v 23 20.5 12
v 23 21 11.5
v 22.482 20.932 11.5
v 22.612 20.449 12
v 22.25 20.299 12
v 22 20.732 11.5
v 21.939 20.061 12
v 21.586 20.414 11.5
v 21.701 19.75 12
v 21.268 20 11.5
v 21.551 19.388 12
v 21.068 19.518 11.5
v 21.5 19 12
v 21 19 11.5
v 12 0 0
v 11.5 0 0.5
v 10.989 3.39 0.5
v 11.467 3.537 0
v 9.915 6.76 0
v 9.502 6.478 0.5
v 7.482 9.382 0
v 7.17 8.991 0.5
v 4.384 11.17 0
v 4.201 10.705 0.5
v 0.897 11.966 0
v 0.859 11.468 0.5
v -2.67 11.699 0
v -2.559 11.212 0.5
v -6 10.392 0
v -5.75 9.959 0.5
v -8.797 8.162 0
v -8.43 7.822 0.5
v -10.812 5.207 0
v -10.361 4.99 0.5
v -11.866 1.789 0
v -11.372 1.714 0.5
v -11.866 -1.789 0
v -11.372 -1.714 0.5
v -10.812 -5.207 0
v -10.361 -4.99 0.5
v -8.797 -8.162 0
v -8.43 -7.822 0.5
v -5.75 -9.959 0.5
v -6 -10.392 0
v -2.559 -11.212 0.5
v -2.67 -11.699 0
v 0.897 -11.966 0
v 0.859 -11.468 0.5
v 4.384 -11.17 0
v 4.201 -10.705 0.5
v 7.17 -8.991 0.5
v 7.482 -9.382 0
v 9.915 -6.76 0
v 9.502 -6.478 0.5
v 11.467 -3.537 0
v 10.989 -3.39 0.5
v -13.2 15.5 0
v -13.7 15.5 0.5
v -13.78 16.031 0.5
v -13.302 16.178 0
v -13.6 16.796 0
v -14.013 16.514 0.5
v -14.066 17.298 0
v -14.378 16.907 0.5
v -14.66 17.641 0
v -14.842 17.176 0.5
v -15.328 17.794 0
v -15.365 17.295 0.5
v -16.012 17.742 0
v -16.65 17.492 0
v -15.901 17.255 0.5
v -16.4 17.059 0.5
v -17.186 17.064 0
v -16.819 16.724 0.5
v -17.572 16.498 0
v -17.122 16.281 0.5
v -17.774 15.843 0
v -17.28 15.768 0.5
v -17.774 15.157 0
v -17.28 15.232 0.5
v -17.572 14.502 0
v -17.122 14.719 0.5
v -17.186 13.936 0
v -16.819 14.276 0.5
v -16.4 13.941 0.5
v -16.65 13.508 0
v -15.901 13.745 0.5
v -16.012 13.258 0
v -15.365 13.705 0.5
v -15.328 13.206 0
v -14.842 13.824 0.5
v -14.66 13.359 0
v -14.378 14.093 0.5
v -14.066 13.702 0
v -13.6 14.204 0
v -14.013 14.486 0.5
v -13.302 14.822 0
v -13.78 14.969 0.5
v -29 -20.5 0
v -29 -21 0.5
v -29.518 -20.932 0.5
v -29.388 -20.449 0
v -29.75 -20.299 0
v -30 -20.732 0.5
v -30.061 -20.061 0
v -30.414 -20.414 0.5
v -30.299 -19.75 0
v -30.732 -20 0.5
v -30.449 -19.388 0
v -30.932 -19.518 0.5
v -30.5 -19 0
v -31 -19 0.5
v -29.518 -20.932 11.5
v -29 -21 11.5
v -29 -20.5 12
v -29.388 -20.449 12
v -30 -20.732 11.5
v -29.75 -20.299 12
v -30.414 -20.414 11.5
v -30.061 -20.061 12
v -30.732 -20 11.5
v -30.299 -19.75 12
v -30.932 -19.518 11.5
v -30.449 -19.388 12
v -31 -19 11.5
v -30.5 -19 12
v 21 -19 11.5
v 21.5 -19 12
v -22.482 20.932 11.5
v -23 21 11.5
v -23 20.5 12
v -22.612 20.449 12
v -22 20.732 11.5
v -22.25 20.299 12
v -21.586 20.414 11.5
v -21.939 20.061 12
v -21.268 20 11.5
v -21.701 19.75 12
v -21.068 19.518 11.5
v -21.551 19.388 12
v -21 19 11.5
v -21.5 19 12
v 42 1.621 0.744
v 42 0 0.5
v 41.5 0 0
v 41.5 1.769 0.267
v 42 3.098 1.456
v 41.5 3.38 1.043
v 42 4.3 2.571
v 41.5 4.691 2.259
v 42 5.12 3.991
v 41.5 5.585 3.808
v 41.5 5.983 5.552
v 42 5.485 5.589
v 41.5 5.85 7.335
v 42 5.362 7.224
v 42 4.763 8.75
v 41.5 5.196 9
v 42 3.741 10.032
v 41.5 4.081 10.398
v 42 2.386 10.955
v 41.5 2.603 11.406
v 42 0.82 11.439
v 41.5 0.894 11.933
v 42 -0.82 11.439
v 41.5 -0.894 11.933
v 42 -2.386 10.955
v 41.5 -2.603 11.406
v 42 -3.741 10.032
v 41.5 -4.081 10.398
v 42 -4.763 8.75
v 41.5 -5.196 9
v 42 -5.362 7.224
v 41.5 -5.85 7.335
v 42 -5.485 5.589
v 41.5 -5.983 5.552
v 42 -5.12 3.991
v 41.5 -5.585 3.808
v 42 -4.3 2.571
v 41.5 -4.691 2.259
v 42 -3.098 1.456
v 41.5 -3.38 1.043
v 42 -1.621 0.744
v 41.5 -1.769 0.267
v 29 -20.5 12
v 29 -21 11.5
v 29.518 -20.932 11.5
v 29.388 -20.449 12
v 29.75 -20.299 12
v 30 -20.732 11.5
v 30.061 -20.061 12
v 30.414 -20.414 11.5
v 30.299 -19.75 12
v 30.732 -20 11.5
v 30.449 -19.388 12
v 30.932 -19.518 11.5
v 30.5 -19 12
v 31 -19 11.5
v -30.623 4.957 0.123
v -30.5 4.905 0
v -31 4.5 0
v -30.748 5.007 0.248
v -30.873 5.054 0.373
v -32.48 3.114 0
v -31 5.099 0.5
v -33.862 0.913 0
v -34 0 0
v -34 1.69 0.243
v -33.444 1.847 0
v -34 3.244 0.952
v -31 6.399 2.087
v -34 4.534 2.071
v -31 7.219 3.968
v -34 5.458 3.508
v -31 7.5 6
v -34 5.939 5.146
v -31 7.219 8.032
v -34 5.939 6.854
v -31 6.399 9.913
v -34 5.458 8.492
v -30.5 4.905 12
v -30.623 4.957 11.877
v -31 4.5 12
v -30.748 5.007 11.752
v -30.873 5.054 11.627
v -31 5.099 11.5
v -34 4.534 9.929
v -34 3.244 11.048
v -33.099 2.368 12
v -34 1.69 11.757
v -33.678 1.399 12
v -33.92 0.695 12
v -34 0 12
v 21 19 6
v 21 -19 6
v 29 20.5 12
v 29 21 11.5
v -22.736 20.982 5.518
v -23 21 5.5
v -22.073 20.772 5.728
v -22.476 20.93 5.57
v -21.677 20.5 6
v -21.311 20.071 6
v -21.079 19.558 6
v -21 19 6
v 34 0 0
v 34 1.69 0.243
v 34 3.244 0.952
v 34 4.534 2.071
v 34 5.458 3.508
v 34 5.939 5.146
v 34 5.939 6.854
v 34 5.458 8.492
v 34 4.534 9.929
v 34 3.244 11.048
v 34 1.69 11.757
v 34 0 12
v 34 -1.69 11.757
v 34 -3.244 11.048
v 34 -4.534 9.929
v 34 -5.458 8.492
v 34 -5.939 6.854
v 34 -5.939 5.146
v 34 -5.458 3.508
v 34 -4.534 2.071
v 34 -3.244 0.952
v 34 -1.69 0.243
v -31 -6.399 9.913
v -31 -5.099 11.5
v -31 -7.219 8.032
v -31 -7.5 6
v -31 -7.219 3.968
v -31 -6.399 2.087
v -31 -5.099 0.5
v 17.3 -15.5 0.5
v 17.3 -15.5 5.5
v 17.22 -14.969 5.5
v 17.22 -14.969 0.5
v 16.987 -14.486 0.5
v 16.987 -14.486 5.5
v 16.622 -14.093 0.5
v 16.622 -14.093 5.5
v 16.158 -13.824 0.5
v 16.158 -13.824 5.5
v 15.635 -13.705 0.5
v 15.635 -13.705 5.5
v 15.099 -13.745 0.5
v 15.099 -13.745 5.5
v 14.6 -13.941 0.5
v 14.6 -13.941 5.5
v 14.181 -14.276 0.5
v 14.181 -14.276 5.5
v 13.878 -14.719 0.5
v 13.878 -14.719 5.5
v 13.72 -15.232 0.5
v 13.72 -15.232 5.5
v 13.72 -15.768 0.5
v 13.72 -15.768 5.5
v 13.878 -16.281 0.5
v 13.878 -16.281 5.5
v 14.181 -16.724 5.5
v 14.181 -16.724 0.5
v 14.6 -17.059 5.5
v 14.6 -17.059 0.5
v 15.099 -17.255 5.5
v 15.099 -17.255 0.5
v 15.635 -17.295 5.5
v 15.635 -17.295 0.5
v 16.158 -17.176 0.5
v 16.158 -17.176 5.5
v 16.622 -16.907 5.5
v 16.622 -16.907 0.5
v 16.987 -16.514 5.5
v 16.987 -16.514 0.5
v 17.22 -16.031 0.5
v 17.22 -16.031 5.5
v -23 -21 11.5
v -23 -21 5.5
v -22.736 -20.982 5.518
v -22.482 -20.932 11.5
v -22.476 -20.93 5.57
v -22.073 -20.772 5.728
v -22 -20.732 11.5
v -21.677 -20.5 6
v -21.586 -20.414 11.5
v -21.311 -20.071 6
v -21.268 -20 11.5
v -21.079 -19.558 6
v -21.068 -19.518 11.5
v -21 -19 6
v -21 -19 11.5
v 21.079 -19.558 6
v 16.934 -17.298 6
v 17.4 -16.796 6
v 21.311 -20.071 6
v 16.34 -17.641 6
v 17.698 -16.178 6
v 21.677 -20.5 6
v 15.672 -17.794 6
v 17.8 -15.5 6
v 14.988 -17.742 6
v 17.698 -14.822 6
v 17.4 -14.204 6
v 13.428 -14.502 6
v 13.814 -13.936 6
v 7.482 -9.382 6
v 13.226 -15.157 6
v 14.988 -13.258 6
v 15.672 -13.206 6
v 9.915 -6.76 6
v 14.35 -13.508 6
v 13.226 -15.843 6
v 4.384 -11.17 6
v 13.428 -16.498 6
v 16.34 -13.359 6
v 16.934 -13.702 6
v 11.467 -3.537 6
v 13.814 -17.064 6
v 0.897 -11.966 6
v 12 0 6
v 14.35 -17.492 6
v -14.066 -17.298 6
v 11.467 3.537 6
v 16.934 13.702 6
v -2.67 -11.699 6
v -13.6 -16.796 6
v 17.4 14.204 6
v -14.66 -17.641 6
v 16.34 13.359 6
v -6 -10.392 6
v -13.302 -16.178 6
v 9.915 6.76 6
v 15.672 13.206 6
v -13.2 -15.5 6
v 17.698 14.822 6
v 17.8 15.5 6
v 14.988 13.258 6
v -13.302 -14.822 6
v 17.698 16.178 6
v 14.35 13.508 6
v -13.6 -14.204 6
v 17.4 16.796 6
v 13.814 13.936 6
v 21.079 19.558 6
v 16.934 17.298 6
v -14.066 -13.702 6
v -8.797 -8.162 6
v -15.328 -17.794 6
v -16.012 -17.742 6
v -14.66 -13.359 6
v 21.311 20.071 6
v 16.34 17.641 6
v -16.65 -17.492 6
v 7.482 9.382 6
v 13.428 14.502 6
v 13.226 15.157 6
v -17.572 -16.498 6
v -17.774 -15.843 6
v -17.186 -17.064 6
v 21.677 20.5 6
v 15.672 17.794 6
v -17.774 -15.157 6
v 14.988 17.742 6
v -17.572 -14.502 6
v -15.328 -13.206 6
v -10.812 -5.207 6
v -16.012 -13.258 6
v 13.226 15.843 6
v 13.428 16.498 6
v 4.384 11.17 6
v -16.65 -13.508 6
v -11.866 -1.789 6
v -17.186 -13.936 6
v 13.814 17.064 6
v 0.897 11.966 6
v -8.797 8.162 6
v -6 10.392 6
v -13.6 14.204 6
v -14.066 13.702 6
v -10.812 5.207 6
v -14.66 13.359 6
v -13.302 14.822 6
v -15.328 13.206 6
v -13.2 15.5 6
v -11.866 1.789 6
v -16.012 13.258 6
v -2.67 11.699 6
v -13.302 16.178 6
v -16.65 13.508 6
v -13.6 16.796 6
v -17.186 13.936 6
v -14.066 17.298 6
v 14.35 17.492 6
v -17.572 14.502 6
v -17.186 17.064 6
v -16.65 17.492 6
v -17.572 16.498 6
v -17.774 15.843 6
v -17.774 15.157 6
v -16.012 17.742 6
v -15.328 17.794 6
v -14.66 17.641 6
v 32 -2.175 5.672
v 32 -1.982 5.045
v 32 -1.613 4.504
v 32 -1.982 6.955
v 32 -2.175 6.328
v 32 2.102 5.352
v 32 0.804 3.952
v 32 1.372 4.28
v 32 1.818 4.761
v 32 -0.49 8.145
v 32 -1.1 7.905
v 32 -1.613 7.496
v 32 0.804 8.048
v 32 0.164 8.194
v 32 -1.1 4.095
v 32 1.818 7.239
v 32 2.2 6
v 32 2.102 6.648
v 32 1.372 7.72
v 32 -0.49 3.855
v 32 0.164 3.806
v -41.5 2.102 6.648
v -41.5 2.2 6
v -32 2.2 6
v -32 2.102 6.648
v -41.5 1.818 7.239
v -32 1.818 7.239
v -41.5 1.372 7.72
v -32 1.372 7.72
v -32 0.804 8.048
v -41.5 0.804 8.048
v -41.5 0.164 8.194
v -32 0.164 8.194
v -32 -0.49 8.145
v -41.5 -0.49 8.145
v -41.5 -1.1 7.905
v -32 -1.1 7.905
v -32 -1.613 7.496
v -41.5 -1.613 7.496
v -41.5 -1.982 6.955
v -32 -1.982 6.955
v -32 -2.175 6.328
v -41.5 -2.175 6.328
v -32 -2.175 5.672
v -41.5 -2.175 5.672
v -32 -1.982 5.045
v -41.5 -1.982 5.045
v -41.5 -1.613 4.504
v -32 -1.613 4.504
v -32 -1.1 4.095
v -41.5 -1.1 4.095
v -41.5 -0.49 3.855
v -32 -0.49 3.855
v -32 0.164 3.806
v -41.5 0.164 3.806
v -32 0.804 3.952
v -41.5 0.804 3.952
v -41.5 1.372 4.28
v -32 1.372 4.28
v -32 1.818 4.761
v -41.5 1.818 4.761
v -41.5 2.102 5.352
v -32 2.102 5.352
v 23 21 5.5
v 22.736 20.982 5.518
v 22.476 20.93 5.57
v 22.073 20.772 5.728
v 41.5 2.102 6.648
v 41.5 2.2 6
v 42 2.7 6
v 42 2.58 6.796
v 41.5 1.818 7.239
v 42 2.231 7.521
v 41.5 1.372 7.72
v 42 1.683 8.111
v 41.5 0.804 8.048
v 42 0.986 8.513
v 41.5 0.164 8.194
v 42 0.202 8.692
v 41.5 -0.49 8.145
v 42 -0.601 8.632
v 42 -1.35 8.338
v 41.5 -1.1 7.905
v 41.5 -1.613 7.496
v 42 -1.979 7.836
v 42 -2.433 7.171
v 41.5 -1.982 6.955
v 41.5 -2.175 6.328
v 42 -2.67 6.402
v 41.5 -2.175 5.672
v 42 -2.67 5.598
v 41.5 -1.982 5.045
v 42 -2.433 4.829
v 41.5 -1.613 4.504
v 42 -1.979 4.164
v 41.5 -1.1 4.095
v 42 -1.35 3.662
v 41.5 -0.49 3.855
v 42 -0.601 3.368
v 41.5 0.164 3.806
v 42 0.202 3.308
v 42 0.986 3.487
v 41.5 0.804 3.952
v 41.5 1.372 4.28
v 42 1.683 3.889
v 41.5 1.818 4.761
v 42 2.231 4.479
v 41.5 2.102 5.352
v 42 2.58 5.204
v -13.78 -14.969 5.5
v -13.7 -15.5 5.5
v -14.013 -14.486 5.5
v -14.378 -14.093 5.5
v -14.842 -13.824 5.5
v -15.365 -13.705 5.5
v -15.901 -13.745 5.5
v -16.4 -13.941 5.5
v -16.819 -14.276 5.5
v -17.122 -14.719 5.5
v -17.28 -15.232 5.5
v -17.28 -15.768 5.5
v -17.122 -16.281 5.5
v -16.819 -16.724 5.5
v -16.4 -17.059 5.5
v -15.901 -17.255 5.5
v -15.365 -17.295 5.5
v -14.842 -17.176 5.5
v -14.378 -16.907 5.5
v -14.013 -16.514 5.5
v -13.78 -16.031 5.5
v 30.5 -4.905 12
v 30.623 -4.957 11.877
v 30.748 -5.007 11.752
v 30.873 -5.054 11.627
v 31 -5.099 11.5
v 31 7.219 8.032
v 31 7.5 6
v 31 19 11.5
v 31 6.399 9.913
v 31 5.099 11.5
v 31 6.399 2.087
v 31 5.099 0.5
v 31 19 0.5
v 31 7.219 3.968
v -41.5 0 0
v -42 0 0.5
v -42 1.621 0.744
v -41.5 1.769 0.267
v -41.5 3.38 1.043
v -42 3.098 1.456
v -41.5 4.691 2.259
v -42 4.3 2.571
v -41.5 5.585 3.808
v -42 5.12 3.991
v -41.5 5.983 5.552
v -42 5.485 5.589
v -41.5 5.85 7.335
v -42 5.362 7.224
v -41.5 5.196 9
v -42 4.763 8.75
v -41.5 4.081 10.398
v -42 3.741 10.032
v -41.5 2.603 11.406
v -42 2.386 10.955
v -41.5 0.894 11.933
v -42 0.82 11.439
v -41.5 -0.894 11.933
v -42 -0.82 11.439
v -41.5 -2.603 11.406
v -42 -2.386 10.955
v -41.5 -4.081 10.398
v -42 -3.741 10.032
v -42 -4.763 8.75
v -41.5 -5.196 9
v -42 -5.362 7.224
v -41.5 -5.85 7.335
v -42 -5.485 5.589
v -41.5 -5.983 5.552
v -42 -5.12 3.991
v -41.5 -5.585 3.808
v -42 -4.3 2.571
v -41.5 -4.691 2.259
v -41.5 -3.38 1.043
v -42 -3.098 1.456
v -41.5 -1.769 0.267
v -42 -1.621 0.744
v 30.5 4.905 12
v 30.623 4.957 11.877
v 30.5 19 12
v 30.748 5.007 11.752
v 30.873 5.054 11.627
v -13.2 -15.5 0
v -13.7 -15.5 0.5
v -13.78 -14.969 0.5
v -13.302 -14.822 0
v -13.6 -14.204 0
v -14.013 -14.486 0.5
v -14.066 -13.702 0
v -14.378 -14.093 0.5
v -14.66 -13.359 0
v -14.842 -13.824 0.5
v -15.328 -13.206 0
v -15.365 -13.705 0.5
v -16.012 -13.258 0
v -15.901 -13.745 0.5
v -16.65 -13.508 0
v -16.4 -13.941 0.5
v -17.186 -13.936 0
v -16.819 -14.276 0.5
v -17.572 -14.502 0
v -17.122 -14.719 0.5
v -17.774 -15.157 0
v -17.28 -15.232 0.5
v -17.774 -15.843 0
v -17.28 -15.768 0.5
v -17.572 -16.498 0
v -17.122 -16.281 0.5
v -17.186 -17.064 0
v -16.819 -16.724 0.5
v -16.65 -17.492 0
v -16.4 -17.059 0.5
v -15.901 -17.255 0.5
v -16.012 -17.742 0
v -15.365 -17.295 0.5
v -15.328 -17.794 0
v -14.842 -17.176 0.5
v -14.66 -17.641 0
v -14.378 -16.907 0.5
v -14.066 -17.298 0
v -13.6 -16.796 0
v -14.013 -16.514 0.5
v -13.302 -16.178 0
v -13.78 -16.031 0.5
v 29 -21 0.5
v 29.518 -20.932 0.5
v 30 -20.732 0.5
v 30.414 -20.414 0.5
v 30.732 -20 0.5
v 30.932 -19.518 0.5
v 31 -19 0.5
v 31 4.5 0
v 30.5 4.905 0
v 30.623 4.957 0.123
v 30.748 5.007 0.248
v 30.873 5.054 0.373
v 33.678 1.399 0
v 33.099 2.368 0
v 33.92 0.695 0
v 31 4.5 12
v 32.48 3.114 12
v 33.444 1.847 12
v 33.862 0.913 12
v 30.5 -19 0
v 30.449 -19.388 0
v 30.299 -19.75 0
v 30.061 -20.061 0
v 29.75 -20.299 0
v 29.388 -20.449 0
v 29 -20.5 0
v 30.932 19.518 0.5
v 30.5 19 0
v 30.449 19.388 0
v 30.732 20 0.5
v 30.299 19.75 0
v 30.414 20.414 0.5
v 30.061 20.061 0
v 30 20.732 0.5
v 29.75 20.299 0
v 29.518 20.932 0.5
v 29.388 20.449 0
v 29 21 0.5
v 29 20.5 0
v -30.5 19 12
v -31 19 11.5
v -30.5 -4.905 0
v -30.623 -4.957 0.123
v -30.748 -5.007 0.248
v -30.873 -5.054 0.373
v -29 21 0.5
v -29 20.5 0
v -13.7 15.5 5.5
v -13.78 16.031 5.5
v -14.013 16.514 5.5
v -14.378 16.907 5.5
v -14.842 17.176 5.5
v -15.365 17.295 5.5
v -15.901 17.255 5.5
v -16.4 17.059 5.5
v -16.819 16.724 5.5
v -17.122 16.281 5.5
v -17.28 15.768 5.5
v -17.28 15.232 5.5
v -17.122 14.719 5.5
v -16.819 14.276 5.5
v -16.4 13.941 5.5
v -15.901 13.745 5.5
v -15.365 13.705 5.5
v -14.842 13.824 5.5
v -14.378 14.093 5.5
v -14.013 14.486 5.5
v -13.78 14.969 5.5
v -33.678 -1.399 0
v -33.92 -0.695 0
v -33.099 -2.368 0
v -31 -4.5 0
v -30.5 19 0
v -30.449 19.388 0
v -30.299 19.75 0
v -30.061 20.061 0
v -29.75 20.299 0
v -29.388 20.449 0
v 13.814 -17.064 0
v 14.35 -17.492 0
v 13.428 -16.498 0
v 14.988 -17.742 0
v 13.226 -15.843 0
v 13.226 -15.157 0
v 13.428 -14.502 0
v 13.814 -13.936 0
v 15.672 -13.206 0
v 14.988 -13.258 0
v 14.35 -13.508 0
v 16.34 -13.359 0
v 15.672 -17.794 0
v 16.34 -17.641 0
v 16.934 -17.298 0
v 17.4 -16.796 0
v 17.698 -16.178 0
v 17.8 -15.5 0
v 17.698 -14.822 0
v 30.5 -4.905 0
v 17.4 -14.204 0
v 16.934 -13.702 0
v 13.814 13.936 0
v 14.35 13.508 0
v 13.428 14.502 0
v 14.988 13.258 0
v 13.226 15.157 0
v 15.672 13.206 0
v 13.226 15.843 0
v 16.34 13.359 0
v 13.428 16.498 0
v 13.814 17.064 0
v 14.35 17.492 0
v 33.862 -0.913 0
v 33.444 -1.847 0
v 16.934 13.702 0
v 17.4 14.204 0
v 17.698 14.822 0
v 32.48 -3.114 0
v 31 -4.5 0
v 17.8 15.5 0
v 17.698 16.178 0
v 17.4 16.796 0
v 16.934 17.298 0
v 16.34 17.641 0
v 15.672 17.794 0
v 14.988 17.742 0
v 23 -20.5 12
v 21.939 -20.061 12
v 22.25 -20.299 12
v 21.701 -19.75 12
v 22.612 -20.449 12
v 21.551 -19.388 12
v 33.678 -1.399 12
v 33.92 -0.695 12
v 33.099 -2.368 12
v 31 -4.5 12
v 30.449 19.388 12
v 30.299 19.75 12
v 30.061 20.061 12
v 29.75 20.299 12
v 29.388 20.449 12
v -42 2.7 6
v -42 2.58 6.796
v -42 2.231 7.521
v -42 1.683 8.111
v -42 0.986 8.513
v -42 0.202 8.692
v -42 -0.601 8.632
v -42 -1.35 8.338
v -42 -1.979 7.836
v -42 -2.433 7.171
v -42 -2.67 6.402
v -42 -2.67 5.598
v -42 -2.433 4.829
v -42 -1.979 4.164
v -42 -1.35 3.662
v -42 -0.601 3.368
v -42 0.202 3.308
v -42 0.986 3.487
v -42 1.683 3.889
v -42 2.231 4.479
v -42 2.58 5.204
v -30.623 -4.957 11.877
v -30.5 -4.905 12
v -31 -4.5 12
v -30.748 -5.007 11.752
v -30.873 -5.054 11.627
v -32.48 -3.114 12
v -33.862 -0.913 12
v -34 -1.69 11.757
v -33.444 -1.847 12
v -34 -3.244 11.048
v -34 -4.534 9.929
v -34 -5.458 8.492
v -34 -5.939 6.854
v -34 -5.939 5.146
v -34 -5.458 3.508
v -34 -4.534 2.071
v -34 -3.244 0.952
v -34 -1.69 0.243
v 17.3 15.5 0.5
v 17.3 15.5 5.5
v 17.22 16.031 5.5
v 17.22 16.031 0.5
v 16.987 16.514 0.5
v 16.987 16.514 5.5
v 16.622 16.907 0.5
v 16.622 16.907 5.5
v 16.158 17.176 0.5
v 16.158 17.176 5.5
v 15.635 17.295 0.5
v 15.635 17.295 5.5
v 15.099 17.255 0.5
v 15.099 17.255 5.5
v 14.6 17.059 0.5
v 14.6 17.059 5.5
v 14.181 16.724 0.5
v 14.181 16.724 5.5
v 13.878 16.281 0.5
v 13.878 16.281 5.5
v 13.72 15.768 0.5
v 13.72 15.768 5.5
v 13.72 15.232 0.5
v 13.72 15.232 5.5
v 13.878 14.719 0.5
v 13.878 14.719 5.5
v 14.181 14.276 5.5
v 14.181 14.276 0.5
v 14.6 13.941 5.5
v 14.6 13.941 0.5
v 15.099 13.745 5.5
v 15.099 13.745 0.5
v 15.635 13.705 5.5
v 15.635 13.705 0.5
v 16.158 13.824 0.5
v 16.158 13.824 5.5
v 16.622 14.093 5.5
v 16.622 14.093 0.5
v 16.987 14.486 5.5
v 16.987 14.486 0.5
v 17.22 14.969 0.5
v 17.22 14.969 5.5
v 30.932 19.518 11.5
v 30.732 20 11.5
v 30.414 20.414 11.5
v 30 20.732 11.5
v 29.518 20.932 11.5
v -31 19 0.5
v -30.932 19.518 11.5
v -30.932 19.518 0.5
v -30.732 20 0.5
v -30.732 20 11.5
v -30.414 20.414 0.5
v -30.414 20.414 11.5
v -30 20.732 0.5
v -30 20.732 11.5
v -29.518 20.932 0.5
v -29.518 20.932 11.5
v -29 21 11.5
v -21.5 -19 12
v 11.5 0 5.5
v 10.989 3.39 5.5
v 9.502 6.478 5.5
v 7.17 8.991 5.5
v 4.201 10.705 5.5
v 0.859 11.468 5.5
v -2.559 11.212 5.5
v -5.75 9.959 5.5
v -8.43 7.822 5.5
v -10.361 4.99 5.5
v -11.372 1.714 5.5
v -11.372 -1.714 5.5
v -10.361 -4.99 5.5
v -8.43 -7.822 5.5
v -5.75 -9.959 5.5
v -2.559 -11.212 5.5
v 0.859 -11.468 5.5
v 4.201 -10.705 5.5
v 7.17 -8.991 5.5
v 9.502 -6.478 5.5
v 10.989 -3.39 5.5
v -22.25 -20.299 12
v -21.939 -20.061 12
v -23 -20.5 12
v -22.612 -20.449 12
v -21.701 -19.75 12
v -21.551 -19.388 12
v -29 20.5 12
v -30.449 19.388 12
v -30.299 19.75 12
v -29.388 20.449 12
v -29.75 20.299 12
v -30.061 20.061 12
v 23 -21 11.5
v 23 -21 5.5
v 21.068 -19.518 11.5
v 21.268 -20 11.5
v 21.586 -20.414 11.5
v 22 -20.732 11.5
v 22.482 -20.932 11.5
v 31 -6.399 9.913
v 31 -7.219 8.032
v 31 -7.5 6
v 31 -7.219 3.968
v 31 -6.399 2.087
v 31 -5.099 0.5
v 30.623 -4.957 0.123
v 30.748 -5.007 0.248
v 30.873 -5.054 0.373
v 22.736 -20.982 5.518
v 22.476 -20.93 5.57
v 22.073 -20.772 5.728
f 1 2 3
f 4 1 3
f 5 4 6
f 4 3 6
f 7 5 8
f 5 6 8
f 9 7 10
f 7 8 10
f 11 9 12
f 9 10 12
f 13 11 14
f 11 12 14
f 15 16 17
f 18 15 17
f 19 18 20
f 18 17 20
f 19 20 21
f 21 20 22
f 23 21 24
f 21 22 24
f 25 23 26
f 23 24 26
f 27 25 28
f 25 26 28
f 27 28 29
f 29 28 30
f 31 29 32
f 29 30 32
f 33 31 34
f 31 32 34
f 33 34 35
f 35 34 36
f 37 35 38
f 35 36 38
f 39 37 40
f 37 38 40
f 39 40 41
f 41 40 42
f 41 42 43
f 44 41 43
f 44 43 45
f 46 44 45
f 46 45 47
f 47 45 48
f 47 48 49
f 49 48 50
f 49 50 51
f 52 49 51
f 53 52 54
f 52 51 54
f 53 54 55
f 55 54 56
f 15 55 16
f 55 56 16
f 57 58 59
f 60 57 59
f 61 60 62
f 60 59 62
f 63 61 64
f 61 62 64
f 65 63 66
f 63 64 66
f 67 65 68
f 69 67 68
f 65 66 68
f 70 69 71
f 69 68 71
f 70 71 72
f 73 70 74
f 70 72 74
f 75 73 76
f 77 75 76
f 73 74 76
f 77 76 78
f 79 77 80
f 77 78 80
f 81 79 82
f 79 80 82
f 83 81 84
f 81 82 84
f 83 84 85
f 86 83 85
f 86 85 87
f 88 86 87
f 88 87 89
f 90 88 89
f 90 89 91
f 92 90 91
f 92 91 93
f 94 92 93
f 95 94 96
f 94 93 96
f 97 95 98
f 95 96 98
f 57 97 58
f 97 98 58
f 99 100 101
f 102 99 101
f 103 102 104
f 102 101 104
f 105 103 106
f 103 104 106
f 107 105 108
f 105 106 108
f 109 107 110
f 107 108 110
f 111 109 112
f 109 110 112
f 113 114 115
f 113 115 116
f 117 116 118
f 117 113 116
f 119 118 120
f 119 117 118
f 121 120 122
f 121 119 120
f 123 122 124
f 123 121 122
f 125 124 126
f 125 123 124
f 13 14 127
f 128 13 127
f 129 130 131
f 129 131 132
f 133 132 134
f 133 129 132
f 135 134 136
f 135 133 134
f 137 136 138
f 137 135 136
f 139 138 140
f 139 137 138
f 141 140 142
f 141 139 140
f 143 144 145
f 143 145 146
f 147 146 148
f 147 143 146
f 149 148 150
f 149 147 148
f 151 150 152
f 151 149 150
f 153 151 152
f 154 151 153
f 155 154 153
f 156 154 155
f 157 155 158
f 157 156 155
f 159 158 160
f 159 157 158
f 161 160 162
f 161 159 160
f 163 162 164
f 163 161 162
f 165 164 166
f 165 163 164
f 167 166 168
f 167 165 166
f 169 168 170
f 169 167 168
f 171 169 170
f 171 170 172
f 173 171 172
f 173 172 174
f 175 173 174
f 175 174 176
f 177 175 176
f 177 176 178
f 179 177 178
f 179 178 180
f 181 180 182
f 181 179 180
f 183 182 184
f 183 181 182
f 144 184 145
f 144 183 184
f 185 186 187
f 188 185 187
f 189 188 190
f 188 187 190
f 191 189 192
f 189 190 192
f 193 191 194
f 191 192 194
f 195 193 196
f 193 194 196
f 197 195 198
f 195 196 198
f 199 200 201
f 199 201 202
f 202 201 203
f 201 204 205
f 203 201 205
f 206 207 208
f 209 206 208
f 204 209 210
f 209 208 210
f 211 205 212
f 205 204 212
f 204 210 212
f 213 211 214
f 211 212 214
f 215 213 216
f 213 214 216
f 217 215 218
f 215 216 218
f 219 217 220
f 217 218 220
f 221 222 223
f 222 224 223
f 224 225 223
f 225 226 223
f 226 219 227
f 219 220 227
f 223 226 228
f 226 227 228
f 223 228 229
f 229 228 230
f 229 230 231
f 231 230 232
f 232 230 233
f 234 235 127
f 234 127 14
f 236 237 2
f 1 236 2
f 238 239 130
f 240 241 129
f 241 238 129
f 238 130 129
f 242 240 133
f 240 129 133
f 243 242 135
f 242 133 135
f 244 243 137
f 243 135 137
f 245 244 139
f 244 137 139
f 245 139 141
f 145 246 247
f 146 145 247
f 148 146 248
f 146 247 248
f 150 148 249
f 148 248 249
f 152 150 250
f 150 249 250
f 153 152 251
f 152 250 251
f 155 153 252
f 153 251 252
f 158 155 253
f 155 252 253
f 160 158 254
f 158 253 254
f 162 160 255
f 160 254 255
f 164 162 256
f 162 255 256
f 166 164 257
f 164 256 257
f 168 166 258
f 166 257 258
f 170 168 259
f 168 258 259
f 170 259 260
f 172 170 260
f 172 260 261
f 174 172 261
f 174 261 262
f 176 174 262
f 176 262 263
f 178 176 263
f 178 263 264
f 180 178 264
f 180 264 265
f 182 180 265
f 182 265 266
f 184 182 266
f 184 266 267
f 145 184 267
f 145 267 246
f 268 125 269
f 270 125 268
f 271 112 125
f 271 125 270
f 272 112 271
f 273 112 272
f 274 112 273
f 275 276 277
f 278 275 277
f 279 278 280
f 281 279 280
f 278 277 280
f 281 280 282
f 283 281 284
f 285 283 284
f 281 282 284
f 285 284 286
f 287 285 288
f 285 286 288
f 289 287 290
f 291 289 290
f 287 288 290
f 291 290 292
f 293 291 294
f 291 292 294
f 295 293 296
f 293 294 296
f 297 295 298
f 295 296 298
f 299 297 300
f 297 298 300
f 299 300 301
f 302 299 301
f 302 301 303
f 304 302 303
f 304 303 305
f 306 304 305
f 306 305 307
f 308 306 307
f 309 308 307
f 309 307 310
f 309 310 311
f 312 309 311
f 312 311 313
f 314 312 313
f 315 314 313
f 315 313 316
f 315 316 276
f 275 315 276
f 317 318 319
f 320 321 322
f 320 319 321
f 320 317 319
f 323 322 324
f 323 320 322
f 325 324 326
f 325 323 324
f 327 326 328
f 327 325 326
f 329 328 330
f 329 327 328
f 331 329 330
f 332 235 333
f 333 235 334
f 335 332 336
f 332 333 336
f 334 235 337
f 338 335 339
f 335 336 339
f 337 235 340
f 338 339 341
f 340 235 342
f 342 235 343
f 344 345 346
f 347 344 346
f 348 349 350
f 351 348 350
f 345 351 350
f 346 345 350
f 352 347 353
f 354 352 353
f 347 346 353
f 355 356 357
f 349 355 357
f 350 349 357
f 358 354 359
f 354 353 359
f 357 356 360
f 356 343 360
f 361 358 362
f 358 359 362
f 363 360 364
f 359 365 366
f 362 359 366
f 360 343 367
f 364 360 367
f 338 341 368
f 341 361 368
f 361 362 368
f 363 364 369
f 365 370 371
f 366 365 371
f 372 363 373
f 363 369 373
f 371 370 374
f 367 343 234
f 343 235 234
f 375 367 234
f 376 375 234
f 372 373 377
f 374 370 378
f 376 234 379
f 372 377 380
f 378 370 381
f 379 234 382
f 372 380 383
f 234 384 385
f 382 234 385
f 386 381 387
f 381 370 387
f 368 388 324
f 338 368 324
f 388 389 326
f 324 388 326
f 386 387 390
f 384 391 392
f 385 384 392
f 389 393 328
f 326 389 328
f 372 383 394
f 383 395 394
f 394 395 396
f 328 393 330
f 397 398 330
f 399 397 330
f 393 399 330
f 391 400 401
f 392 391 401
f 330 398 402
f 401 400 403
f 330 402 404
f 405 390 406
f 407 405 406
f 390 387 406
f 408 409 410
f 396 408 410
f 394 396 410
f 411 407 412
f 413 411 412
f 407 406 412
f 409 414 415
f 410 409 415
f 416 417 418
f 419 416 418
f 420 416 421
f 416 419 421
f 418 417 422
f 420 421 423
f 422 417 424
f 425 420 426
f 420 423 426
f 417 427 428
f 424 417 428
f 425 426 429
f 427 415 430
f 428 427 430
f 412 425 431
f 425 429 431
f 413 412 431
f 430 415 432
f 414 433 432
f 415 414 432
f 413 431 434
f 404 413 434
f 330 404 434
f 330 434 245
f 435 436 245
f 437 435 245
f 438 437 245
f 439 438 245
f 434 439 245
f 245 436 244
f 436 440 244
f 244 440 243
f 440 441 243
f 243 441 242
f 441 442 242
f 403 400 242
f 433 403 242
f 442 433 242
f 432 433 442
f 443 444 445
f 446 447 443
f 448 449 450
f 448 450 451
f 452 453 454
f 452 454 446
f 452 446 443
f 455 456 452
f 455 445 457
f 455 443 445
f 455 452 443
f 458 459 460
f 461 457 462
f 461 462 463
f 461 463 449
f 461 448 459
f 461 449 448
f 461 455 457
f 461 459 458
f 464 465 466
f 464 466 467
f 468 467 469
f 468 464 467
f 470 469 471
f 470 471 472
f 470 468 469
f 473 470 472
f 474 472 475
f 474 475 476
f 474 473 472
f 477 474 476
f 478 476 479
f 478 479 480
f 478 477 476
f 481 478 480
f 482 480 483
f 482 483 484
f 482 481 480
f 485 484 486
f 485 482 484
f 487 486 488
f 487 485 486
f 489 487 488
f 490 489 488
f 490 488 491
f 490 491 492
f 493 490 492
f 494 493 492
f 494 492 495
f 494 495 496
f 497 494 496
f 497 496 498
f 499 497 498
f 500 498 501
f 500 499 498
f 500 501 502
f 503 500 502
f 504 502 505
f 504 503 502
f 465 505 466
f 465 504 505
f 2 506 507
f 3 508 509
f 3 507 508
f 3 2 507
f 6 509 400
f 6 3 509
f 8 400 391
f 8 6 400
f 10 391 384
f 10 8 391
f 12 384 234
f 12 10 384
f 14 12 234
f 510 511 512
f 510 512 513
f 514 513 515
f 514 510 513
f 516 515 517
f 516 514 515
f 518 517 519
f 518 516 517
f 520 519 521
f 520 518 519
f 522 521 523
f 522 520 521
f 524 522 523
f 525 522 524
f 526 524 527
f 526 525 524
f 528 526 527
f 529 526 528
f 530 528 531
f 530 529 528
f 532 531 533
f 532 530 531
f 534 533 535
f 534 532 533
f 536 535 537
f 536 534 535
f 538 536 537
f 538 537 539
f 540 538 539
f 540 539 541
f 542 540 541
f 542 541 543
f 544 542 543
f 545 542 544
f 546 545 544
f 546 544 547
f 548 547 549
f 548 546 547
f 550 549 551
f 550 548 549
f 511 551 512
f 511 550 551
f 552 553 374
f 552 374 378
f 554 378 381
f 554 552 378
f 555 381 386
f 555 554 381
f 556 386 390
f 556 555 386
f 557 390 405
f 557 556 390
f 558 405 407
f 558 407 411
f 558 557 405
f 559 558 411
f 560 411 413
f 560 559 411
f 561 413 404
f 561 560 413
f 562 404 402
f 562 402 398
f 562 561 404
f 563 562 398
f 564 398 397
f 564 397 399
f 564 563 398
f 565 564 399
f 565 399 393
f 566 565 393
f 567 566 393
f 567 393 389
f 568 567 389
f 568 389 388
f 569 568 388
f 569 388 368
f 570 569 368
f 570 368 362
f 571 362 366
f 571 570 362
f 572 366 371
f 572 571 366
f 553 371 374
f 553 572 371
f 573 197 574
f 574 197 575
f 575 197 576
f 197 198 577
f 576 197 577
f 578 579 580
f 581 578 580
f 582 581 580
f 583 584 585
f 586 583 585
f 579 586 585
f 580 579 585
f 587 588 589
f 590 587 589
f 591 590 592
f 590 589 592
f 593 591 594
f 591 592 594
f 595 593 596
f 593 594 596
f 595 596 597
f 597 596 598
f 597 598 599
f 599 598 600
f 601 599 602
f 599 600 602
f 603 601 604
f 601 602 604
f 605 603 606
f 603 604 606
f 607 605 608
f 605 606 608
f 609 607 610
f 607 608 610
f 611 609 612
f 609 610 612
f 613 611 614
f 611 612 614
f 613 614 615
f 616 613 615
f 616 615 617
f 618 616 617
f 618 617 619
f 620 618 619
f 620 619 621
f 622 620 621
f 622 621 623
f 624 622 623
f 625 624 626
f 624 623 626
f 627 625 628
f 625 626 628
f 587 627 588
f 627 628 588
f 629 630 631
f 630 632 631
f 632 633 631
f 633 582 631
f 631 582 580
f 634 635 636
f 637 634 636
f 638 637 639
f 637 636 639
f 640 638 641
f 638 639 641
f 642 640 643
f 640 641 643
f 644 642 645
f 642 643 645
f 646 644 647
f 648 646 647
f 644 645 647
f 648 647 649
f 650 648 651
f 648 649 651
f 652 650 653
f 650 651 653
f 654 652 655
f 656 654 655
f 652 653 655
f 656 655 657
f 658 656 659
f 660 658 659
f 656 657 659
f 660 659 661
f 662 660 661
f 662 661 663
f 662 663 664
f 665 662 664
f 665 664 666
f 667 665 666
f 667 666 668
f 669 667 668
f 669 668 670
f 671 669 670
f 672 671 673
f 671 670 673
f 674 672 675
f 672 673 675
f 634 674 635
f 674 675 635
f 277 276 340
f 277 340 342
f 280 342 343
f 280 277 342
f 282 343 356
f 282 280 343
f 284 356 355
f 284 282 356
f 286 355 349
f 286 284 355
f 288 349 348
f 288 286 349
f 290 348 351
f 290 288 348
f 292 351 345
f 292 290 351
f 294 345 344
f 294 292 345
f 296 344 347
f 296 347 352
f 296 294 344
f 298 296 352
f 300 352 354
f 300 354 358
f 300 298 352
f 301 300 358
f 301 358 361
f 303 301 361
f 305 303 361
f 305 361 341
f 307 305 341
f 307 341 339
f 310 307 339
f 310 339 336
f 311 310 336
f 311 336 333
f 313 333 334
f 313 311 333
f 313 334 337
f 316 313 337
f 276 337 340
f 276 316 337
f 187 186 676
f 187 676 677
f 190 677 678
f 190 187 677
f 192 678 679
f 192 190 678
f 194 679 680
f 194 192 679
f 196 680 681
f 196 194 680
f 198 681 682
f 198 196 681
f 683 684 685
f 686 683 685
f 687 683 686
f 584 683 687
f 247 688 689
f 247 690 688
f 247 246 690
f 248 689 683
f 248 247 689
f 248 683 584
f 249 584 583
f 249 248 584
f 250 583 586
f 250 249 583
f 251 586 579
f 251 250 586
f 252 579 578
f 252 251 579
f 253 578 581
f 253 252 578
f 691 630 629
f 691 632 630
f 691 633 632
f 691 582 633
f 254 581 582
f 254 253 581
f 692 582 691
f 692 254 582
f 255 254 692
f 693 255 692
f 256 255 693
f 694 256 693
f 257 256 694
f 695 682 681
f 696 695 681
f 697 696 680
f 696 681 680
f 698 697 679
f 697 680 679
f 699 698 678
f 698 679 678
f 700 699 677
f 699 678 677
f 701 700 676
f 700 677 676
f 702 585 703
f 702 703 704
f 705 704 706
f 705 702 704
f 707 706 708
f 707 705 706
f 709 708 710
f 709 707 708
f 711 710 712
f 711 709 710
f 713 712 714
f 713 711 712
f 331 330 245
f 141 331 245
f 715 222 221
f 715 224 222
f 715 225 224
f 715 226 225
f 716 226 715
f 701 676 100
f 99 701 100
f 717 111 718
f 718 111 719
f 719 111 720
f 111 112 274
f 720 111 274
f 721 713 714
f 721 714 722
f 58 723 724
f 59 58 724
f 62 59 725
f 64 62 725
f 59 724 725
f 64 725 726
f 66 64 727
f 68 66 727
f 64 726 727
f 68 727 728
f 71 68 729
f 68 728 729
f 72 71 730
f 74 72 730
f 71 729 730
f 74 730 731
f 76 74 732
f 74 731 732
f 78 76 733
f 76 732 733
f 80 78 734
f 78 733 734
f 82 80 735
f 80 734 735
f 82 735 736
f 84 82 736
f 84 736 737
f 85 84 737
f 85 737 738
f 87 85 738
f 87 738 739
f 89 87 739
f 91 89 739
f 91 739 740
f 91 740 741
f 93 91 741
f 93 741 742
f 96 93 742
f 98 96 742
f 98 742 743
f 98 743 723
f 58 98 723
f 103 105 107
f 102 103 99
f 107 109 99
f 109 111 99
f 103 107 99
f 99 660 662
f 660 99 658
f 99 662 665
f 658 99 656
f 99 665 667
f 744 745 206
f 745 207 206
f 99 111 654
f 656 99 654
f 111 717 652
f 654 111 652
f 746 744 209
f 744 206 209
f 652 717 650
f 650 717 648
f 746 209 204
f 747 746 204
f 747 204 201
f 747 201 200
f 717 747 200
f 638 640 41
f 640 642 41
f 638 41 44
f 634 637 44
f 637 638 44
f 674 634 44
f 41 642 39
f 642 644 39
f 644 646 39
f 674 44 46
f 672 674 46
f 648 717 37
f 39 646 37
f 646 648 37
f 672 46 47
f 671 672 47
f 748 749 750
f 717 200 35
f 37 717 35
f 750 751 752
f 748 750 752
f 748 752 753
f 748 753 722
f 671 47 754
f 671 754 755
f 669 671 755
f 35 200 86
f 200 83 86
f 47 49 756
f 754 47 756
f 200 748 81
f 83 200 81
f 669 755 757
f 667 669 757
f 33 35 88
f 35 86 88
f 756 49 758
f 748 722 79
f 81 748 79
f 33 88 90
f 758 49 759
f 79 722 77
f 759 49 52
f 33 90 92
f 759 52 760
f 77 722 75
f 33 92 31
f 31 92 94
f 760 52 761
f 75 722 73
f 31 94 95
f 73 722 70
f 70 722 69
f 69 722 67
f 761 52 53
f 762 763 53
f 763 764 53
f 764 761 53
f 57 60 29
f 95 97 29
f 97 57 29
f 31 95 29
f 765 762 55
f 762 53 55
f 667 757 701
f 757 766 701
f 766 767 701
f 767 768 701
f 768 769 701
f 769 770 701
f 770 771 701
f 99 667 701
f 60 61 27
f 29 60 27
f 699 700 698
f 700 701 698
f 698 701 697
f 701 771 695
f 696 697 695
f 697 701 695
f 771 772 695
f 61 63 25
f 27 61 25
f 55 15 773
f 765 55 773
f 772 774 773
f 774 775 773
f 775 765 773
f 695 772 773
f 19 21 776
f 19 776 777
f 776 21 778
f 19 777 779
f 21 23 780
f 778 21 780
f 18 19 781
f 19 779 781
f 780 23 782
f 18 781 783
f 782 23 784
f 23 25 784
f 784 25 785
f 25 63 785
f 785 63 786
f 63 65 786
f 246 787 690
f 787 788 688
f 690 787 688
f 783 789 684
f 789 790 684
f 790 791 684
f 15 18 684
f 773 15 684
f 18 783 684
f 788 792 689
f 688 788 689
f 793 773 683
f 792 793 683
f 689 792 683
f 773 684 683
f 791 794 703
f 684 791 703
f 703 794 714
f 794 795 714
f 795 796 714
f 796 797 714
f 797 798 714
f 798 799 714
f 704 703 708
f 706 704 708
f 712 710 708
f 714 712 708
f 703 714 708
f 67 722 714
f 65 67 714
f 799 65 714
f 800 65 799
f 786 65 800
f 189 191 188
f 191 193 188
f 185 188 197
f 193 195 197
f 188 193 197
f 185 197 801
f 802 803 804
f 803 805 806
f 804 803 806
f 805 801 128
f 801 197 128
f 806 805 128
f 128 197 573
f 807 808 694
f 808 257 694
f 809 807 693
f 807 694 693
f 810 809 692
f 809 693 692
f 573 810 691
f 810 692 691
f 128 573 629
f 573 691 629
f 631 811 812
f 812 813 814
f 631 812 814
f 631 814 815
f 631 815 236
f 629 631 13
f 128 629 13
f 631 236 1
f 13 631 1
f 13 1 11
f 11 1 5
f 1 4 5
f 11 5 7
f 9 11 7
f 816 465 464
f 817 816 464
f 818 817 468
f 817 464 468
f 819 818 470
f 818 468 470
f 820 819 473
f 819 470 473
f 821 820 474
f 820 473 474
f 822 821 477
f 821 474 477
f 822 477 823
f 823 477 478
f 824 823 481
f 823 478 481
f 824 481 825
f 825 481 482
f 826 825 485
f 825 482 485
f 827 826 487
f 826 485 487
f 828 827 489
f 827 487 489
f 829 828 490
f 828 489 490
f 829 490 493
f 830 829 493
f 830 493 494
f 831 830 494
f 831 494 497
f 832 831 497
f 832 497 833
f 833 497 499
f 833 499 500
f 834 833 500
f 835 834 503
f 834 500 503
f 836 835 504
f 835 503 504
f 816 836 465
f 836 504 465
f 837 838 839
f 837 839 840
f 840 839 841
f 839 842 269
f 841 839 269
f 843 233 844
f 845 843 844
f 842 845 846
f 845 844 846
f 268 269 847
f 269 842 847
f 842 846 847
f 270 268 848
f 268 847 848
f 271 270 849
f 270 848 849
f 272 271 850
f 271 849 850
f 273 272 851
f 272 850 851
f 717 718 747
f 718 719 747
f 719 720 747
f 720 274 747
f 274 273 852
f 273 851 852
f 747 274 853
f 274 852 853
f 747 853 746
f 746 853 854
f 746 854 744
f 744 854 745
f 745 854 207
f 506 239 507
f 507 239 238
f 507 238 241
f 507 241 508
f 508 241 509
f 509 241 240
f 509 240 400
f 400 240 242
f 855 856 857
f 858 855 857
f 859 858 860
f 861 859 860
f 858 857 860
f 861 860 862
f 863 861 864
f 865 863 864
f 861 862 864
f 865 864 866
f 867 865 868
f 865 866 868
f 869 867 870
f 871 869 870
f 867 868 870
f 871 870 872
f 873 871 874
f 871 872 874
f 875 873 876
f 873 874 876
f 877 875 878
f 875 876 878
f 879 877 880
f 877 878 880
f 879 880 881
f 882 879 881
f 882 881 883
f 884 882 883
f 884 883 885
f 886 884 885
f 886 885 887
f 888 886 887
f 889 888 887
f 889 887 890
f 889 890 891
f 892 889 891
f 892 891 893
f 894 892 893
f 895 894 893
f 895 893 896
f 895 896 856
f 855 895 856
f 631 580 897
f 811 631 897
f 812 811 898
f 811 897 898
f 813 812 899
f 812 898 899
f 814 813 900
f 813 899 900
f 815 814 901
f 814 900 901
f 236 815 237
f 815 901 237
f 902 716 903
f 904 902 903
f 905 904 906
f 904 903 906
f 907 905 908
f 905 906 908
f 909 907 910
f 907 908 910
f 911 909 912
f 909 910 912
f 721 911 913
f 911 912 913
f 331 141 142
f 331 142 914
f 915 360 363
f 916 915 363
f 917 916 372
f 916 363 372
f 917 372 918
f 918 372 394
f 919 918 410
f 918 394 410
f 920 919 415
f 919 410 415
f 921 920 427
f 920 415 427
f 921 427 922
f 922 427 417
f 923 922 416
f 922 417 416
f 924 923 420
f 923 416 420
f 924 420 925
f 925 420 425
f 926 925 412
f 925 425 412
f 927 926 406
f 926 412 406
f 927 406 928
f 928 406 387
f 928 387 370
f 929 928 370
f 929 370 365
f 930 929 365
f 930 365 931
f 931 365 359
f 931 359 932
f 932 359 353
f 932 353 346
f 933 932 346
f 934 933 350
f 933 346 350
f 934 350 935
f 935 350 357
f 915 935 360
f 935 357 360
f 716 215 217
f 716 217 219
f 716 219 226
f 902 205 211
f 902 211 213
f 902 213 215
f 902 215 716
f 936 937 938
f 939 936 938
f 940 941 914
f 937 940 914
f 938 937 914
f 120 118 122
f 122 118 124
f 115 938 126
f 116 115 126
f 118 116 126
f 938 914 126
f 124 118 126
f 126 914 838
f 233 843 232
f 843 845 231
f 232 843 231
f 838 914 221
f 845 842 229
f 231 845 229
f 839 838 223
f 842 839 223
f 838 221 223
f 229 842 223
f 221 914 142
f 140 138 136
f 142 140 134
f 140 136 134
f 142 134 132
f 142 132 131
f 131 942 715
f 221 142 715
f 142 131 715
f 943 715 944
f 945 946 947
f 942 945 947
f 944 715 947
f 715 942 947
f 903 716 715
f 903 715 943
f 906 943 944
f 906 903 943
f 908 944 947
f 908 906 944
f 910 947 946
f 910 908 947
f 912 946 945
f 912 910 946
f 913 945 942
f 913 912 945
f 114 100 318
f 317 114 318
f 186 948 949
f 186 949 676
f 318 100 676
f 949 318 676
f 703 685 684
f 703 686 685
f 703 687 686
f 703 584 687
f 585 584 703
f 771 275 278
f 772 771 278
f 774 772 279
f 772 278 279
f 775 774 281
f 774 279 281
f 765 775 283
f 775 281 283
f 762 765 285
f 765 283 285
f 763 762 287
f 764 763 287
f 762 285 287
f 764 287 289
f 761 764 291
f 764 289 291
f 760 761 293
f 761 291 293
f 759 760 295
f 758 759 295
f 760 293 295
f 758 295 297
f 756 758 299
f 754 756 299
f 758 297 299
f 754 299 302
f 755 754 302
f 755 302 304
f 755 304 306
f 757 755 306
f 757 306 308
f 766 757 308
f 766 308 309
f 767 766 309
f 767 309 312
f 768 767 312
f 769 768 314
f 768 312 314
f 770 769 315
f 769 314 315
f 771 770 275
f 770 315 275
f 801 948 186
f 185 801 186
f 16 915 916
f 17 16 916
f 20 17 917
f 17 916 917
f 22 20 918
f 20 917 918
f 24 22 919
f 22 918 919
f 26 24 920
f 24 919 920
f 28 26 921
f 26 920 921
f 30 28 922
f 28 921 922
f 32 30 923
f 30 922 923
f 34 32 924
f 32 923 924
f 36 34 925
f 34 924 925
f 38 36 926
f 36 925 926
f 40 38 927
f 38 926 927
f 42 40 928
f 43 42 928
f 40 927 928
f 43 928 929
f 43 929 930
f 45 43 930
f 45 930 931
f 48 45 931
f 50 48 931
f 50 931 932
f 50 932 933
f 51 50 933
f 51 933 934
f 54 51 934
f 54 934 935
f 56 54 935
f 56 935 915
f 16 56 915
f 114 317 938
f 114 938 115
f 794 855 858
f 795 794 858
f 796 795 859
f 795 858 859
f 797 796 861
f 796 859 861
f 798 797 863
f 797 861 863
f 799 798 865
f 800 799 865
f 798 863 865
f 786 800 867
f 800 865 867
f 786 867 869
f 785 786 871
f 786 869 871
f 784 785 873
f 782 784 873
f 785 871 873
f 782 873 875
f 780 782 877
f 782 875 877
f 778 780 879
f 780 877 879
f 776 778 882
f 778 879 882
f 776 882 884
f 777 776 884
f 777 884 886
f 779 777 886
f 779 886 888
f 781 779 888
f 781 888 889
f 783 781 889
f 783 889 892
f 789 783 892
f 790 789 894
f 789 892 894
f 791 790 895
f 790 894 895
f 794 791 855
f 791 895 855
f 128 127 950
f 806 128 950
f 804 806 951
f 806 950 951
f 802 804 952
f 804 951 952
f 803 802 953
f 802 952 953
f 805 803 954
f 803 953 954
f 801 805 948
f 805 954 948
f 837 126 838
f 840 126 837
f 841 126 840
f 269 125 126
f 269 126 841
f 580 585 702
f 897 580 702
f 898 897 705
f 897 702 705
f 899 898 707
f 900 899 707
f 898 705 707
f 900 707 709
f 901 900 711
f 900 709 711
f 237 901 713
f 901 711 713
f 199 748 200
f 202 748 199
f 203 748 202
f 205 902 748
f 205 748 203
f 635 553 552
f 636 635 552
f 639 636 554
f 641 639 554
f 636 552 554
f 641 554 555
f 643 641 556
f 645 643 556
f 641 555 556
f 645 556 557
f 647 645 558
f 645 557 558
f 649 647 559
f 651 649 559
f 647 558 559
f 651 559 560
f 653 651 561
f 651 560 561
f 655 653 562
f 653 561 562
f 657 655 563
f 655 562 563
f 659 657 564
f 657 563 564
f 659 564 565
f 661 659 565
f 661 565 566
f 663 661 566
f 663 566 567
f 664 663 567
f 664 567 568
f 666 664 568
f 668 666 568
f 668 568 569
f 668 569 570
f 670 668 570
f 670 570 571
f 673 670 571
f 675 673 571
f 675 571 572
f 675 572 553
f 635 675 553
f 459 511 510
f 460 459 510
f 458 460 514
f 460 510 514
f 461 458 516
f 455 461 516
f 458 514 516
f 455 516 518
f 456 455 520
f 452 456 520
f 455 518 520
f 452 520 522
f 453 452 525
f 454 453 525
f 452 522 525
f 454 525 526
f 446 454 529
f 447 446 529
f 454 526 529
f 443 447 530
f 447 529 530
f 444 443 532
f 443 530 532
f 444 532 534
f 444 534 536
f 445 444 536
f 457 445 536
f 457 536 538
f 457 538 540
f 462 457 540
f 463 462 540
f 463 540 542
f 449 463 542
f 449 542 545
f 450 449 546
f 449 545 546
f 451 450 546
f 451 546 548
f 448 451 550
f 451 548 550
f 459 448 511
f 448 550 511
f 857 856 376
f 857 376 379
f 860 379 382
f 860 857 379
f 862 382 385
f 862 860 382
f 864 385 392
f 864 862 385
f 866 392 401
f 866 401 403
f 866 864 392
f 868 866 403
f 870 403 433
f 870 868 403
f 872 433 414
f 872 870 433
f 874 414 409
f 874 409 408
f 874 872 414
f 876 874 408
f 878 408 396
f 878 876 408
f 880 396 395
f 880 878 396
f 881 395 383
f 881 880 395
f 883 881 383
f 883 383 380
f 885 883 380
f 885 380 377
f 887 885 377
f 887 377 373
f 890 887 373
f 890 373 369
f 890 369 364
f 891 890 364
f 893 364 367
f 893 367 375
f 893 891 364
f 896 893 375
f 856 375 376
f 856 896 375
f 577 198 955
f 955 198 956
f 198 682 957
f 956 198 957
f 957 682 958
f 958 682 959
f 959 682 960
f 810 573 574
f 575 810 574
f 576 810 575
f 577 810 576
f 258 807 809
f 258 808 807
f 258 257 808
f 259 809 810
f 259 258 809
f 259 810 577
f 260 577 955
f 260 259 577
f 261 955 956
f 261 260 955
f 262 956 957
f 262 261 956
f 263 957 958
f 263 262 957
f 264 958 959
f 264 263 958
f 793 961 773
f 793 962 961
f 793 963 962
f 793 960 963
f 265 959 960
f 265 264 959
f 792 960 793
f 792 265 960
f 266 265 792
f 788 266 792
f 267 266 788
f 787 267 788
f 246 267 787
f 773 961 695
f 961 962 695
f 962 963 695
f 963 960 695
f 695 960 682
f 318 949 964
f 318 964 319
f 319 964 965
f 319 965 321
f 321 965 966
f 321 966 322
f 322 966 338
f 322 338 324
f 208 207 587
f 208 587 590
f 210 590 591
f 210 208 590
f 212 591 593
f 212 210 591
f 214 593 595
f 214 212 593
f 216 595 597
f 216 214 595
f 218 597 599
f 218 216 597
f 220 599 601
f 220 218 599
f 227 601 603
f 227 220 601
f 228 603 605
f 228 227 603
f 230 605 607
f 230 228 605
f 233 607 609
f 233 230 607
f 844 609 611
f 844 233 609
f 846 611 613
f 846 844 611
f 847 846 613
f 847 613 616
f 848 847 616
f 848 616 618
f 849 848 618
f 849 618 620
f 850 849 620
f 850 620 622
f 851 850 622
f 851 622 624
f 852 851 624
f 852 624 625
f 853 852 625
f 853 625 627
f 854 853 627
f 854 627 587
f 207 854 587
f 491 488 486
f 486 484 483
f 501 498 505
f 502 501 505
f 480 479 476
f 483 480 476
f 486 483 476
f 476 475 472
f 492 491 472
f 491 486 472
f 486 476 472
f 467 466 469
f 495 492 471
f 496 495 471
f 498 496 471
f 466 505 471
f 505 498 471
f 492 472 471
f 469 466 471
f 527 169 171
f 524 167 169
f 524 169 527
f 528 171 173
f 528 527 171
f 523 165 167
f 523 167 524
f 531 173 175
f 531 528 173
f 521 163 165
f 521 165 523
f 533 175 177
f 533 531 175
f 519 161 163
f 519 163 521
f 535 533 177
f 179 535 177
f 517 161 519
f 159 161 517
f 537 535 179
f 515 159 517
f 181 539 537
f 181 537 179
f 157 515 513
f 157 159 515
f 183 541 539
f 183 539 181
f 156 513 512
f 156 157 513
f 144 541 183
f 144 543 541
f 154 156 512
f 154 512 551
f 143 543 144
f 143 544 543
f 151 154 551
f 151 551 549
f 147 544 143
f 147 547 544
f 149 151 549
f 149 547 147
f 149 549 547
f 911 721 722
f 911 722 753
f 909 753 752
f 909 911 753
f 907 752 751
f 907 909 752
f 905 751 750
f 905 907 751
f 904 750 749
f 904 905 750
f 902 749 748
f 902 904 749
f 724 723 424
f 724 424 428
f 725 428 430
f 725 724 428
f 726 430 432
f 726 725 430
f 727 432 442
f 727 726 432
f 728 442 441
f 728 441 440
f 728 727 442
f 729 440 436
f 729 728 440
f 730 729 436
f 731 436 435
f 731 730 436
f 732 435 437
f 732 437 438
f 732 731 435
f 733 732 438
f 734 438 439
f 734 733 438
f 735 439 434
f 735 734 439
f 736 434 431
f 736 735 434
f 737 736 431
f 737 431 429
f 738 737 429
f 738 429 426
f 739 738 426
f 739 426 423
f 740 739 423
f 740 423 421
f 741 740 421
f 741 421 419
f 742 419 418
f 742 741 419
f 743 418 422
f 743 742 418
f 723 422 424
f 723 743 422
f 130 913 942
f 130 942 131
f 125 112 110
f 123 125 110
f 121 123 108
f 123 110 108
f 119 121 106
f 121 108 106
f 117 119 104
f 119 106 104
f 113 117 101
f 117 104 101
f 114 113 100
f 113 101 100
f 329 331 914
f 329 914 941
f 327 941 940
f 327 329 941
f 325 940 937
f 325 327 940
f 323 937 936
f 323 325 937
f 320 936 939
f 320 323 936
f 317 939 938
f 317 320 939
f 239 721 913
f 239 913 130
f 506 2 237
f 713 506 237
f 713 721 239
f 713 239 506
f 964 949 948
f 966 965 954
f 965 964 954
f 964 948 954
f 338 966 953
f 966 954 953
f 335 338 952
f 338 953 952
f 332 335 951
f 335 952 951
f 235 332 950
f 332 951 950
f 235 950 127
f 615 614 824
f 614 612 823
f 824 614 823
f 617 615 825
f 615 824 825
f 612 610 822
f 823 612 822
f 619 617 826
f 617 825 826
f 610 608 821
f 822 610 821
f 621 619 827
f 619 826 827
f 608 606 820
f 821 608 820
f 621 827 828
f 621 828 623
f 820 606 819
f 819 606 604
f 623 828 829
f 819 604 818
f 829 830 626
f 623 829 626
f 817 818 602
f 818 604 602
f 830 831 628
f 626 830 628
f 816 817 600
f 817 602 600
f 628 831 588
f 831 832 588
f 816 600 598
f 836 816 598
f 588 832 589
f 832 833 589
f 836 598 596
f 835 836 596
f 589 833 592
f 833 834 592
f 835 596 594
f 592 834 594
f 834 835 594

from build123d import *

# Parameters (mm, degrees)
AUFSATZ_LINEAR_AUSTRAGEN1_DEPTH = 6
SKIZZE2_W                       = 10
SKIZZE2_H                       = 42
AUFSATZ_LINEAR_AUSTRAGEN2_DEPTH = 6
SKIZZE3_R                       = 6
AUFSATZ_LINEAR_AUSTRAGEN3_DEPTH = 11
SKIZZE5_R                       = 2.2
SCHNITT_LINEAR_AUSTRAGEN2_DEPTH = 10
SKIZZE4_R                       = 11.5
SKIZZE4_R_2                     = 1.8
SCHNITT_LINEAR_AUSTRAGEN1_DEPTH = 8
FASE1_SIZE                      = 1.5
FASE1_SIZE_2                    = 3
FASE2_SIZE                      = 1.5
FASE2_SIZE_2                    = 3
VERRUNDUNG1_R                   = 2
FASE3_SIZE                      = 0.5


with BuildPart() as part:
    # Skizze1 → Aufsatz-Linear austragen1 (new body)
    with BuildSketch(Plane.XY):
        Polygon((21, 21), (31, 21), (31, -21), (21, -21), (-21, -21), (-31, -21), (-31, 21), (-21, 21), align=None)
    extrude(amount=AUFSATZ_LINEAR_AUSTRAGEN1_DEPTH)

    # Skizze2 → Aufsatz-Linear austragen2 (add)
    with BuildSketch(Plane.XY.offset(6)):
        with Locations((26, 0)):
            Rectangle(SKIZZE2_W, SKIZZE2_H)
        with Locations((-26, 0)):
            Rectangle(SKIZZE2_W, SKIZZE2_H)
    extrude(amount=AUFSATZ_LINEAR_AUSTRAGEN2_DEPTH)

    # Skizze3 → Aufsatz-Linear austragen3 (add)
    with BuildSketch(Plane(origin=(31, 0, 0), x_dir=(0, 0, -1), z_dir=(1, 0, 0))):
        with Locations((-6, 0)):
            Circle(SKIZZE3_R)
    aufsatz_linear_austragen3 = extrude(amount=AUFSATZ_LINEAR_AUSTRAGEN3_DEPTH)

    # Skizze5 → Schnitt-Linear austragen2 (cut)
    with BuildSketch(Plane(origin=(42, 0, 0), x_dir=(0, 0, -1), z_dir=(1, 0, 0))):
        with Locations(Location((-6, 0, 0), (0, 0, 90))):
            Circle(SKIZZE5_R)
    schnitt_linear_austragen2 = extrude(amount=-SCHNITT_LINEAR_AUSTRAGEN2_DEPTH, mode=Mode.SUBTRACT)

    # Spiegeln1: Aufsatz-Linear austragen3, Schnitt-Linear austragen2 across plane
    add(aufsatz_linear_austragen3.mirror(Plane(origin=(0, 0, 0), x_dir=(0, 0, 1), z_dir=(1, 0, 0))))
    add(schnitt_linear_austragen2.mirror(Plane(origin=(0, 0, 0), x_dir=(0, 0, 1), z_dir=(1, 0, 0))), mode=Mode.SUBTRACT)

    # Skizze4 → Schnitt-Linear austragen1 (cut)
    with BuildSketch(Plane.XY.offset(6)):
        Circle(SKIZZE4_R)
        with Locations((-15.5, 15.5)):
            Circle(SKIZZE4_R_2)
        with Locations((15.5, 15.5)):
            Circle(SKIZZE4_R_2)
        with Locations((15.5, -15.5)):
            Circle(SKIZZE4_R_2)
        with Locations((-15.5, -15.5)):
            Circle(SKIZZE4_R_2)
    extrude(amount=-SCHNITT_LINEAR_AUSTRAGEN1_DEPTH, mode=Mode.SUBTRACT)

    # Fase1
    # the kernel refuses this chamfer: 3, 1.5 mm, written as the material it adds along each edge
    with BuildSketch(Plane(origin=(31, 0, 6), x_dir=(0, 0, -1), z_dir=(0, -1, 0))) as fase1_piece_1_section:
        Polygon((6 + FASE1_SIZE, 0), (6, FASE1_SIZE_2), (6, 0), align=None)
    fase1_piece_1 = revolve(axis=Axis((31, 0, 6), (1, 0, 0)), revolution_arc=179.999999686, mode=Mode.PRIVATE)
    fase1_piece_1 = split(fase1_piece_1, bisect_by=Plane(origin=(32.485350769, 6.720701537, 0), z_dir=(0, 0, 1)), keep=Keep.TOP, mode=Mode.PRIVATE)
    fase1_piece_1 = split(fase1_piece_1, bisect_by=Plane(origin=(32.485350769, 6.720701537, 12), z_dir=(0, 0, -1)), keep=Keep.TOP, mode=Mode.PRIVATE)
    add(fase1_piece_1)
    with BuildSketch(Plane(origin=(31, 0, 6), x_dir=(0, 5.472961761905791e-09, 1.0), z_dir=(0, 1.0, -5.472961761905791e-09))) as fase1_piece_2_section:
        Polygon((6 + FASE1_SIZE, 0), (6, FASE1_SIZE_2), (6, 0), align=None)
    fase1_piece_2 = revolve(axis=Axis((31, 0, 6), (1, 0, 0)), revolution_arc=180.000000314, mode=Mode.PRIVATE)
    fase1_piece_2 = split(fase1_piece_2, bisect_by=Plane(origin=(32.485350772, -6.720701535, 0), z_dir=(0, 0, 1)), keep=Keep.TOP, mode=Mode.PRIVATE)
    fase1_piece_2 = split(fase1_piece_2, bisect_by=Plane(origin=(32.485350772, -6.720701535, 12), z_dir=(0, 0, -1)), keep=Keep.TOP, mode=Mode.PRIVATE)
    add(fase1_piece_2)

    # Fase2
    # the kernel refuses this chamfer: 3, 1.5 mm, written as the material it adds along each edge
    with BuildSketch(Plane(origin=(-31, 0, 6), x_dir=(0, 0, -1), z_dir=(0, -1, 0))) as fase2_piece_1_section:
        Polygon((6 + FASE2_SIZE, 0), (6, -FASE2_SIZE_2), (6, 0), align=None)
    fase2_piece_1 = revolve(axis=Axis((-31, 0, 6), (1, 0, 0)), revolution_arc=179.999999686, mode=Mode.PRIVATE)
    fase2_piece_1 = split(fase2_piece_1, bisect_by=Plane(origin=(-32.485350769, 6.720701537, 0), z_dir=(0, 0, 1)), keep=Keep.TOP, mode=Mode.PRIVATE)
    fase2_piece_1 = split(fase2_piece_1, bisect_by=Plane(origin=(-32.485350769, 6.720701537, 12), z_dir=(0, 0, -1)), keep=Keep.TOP, mode=Mode.PRIVATE)
    add(fase2_piece_1)
    with BuildSketch(Plane(origin=(-31, 0, 6), x_dir=(0, 5.472961761905791e-09, 1.0), z_dir=(0, 1.0, -5.472961761905791e-09))) as fase2_piece_2_section:
        Polygon((6 + FASE2_SIZE, 0), (6, -FASE2_SIZE_2), (6, 0), align=None)
    fase2_piece_2 = revolve(axis=Axis((-31, 0, 6), (1, 0, 0)), revolution_arc=180.000000314, mode=Mode.PRIVATE)
    fase2_piece_2 = split(fase2_piece_2, bisect_by=Plane(origin=(-32.485350772, -6.720701535, 0), z_dir=(0, 0, 1)), keep=Keep.TOP, mode=Mode.PRIVATE)
    fase2_piece_2 = split(fase2_piece_2, bisect_by=Plane(origin=(-32.485350772, -6.720701535, 12), z_dir=(0, 0, -1)), keep=Keep.TOP, mode=Mode.PRIVATE)
    add(fase2_piece_2)

    # Verrundung1
    verrundung1_edges = [part.edges().sort_by_distance(p)[0] for p in [
        (31, 21, 6),
        (31, -21, 6),
        (-31, -21, 6),
        (-31, 21, 6),
        (21, -21, 9),
        (21, 21, 9),
        (-21, 21, 9),
        (-21, -21, 9),
    ]]
    fillet(verrundung1_edges, radius=VERRUNDUNG1_R)

    # Fase3
    fase3_edges = [part.edges().sort_by_distance(p)[0] for p in [
        (-31, -11.75, 0),
        (-31, 11.75, 12),
        (-21, 0, 12),
        (0, -21, 0),
        (26, -21, 12),
        (-26, -21, 12),
        (-26, 21, 12),
        (-31, -11.75, 12),
        (-30.414213562, 20.414213562, 12),
        (-30.414213562, -20.414213562, 12),
        (-21.585786438, 20.414213562, 12),
        (-21.585786438, -20.414213562, 12),
        (21, 0, 12),
        (31, 11.75, 12),
        (26, 21, 12),
        (30.414213562, 20.414213562, 12),
        (30.414213562, -20.414213562, 12),
        (21.585786438, 20.414213562, 12),
        (21.585786438, -20.414213562, 12),
        (0, 21, 0),
        (-31, 11.75, 0),
        (31, -11.75, 0),
        (30.414213562, 20.414213562, 0),
        (-30.414213562, 20.414213562, 0),
        (30.414213562, -20.414213562, 0),
        (-30.414213562, -20.414213562, 0),
        (0, 21, 6),
        (0, -21, 6),
        (42, 0, 12),
        (42, -2.2, 6),
        (-42, 0, 12),
        (-42, -2.2, 6),
        (-17.3, -15.5, 0),
        (-17.3, -15.5, 6),
        (13.7, -15.5, 0),
        (13.7, -15.5, 6),
        (13.7, 15.5, 0),
        (13.7, 15.5, 6),
        (-17.3, 15.5, 0),
        (-17.3, 15.5, 6),
        (-11.5, 0, 0),
        (-11.5, 0, 6),
        (31, -11.75, 12),
        (31, 11.75, 0),
    ]]
    chamfer(fase3_edges, length=FASE3_SIZE)


solid = part.part
